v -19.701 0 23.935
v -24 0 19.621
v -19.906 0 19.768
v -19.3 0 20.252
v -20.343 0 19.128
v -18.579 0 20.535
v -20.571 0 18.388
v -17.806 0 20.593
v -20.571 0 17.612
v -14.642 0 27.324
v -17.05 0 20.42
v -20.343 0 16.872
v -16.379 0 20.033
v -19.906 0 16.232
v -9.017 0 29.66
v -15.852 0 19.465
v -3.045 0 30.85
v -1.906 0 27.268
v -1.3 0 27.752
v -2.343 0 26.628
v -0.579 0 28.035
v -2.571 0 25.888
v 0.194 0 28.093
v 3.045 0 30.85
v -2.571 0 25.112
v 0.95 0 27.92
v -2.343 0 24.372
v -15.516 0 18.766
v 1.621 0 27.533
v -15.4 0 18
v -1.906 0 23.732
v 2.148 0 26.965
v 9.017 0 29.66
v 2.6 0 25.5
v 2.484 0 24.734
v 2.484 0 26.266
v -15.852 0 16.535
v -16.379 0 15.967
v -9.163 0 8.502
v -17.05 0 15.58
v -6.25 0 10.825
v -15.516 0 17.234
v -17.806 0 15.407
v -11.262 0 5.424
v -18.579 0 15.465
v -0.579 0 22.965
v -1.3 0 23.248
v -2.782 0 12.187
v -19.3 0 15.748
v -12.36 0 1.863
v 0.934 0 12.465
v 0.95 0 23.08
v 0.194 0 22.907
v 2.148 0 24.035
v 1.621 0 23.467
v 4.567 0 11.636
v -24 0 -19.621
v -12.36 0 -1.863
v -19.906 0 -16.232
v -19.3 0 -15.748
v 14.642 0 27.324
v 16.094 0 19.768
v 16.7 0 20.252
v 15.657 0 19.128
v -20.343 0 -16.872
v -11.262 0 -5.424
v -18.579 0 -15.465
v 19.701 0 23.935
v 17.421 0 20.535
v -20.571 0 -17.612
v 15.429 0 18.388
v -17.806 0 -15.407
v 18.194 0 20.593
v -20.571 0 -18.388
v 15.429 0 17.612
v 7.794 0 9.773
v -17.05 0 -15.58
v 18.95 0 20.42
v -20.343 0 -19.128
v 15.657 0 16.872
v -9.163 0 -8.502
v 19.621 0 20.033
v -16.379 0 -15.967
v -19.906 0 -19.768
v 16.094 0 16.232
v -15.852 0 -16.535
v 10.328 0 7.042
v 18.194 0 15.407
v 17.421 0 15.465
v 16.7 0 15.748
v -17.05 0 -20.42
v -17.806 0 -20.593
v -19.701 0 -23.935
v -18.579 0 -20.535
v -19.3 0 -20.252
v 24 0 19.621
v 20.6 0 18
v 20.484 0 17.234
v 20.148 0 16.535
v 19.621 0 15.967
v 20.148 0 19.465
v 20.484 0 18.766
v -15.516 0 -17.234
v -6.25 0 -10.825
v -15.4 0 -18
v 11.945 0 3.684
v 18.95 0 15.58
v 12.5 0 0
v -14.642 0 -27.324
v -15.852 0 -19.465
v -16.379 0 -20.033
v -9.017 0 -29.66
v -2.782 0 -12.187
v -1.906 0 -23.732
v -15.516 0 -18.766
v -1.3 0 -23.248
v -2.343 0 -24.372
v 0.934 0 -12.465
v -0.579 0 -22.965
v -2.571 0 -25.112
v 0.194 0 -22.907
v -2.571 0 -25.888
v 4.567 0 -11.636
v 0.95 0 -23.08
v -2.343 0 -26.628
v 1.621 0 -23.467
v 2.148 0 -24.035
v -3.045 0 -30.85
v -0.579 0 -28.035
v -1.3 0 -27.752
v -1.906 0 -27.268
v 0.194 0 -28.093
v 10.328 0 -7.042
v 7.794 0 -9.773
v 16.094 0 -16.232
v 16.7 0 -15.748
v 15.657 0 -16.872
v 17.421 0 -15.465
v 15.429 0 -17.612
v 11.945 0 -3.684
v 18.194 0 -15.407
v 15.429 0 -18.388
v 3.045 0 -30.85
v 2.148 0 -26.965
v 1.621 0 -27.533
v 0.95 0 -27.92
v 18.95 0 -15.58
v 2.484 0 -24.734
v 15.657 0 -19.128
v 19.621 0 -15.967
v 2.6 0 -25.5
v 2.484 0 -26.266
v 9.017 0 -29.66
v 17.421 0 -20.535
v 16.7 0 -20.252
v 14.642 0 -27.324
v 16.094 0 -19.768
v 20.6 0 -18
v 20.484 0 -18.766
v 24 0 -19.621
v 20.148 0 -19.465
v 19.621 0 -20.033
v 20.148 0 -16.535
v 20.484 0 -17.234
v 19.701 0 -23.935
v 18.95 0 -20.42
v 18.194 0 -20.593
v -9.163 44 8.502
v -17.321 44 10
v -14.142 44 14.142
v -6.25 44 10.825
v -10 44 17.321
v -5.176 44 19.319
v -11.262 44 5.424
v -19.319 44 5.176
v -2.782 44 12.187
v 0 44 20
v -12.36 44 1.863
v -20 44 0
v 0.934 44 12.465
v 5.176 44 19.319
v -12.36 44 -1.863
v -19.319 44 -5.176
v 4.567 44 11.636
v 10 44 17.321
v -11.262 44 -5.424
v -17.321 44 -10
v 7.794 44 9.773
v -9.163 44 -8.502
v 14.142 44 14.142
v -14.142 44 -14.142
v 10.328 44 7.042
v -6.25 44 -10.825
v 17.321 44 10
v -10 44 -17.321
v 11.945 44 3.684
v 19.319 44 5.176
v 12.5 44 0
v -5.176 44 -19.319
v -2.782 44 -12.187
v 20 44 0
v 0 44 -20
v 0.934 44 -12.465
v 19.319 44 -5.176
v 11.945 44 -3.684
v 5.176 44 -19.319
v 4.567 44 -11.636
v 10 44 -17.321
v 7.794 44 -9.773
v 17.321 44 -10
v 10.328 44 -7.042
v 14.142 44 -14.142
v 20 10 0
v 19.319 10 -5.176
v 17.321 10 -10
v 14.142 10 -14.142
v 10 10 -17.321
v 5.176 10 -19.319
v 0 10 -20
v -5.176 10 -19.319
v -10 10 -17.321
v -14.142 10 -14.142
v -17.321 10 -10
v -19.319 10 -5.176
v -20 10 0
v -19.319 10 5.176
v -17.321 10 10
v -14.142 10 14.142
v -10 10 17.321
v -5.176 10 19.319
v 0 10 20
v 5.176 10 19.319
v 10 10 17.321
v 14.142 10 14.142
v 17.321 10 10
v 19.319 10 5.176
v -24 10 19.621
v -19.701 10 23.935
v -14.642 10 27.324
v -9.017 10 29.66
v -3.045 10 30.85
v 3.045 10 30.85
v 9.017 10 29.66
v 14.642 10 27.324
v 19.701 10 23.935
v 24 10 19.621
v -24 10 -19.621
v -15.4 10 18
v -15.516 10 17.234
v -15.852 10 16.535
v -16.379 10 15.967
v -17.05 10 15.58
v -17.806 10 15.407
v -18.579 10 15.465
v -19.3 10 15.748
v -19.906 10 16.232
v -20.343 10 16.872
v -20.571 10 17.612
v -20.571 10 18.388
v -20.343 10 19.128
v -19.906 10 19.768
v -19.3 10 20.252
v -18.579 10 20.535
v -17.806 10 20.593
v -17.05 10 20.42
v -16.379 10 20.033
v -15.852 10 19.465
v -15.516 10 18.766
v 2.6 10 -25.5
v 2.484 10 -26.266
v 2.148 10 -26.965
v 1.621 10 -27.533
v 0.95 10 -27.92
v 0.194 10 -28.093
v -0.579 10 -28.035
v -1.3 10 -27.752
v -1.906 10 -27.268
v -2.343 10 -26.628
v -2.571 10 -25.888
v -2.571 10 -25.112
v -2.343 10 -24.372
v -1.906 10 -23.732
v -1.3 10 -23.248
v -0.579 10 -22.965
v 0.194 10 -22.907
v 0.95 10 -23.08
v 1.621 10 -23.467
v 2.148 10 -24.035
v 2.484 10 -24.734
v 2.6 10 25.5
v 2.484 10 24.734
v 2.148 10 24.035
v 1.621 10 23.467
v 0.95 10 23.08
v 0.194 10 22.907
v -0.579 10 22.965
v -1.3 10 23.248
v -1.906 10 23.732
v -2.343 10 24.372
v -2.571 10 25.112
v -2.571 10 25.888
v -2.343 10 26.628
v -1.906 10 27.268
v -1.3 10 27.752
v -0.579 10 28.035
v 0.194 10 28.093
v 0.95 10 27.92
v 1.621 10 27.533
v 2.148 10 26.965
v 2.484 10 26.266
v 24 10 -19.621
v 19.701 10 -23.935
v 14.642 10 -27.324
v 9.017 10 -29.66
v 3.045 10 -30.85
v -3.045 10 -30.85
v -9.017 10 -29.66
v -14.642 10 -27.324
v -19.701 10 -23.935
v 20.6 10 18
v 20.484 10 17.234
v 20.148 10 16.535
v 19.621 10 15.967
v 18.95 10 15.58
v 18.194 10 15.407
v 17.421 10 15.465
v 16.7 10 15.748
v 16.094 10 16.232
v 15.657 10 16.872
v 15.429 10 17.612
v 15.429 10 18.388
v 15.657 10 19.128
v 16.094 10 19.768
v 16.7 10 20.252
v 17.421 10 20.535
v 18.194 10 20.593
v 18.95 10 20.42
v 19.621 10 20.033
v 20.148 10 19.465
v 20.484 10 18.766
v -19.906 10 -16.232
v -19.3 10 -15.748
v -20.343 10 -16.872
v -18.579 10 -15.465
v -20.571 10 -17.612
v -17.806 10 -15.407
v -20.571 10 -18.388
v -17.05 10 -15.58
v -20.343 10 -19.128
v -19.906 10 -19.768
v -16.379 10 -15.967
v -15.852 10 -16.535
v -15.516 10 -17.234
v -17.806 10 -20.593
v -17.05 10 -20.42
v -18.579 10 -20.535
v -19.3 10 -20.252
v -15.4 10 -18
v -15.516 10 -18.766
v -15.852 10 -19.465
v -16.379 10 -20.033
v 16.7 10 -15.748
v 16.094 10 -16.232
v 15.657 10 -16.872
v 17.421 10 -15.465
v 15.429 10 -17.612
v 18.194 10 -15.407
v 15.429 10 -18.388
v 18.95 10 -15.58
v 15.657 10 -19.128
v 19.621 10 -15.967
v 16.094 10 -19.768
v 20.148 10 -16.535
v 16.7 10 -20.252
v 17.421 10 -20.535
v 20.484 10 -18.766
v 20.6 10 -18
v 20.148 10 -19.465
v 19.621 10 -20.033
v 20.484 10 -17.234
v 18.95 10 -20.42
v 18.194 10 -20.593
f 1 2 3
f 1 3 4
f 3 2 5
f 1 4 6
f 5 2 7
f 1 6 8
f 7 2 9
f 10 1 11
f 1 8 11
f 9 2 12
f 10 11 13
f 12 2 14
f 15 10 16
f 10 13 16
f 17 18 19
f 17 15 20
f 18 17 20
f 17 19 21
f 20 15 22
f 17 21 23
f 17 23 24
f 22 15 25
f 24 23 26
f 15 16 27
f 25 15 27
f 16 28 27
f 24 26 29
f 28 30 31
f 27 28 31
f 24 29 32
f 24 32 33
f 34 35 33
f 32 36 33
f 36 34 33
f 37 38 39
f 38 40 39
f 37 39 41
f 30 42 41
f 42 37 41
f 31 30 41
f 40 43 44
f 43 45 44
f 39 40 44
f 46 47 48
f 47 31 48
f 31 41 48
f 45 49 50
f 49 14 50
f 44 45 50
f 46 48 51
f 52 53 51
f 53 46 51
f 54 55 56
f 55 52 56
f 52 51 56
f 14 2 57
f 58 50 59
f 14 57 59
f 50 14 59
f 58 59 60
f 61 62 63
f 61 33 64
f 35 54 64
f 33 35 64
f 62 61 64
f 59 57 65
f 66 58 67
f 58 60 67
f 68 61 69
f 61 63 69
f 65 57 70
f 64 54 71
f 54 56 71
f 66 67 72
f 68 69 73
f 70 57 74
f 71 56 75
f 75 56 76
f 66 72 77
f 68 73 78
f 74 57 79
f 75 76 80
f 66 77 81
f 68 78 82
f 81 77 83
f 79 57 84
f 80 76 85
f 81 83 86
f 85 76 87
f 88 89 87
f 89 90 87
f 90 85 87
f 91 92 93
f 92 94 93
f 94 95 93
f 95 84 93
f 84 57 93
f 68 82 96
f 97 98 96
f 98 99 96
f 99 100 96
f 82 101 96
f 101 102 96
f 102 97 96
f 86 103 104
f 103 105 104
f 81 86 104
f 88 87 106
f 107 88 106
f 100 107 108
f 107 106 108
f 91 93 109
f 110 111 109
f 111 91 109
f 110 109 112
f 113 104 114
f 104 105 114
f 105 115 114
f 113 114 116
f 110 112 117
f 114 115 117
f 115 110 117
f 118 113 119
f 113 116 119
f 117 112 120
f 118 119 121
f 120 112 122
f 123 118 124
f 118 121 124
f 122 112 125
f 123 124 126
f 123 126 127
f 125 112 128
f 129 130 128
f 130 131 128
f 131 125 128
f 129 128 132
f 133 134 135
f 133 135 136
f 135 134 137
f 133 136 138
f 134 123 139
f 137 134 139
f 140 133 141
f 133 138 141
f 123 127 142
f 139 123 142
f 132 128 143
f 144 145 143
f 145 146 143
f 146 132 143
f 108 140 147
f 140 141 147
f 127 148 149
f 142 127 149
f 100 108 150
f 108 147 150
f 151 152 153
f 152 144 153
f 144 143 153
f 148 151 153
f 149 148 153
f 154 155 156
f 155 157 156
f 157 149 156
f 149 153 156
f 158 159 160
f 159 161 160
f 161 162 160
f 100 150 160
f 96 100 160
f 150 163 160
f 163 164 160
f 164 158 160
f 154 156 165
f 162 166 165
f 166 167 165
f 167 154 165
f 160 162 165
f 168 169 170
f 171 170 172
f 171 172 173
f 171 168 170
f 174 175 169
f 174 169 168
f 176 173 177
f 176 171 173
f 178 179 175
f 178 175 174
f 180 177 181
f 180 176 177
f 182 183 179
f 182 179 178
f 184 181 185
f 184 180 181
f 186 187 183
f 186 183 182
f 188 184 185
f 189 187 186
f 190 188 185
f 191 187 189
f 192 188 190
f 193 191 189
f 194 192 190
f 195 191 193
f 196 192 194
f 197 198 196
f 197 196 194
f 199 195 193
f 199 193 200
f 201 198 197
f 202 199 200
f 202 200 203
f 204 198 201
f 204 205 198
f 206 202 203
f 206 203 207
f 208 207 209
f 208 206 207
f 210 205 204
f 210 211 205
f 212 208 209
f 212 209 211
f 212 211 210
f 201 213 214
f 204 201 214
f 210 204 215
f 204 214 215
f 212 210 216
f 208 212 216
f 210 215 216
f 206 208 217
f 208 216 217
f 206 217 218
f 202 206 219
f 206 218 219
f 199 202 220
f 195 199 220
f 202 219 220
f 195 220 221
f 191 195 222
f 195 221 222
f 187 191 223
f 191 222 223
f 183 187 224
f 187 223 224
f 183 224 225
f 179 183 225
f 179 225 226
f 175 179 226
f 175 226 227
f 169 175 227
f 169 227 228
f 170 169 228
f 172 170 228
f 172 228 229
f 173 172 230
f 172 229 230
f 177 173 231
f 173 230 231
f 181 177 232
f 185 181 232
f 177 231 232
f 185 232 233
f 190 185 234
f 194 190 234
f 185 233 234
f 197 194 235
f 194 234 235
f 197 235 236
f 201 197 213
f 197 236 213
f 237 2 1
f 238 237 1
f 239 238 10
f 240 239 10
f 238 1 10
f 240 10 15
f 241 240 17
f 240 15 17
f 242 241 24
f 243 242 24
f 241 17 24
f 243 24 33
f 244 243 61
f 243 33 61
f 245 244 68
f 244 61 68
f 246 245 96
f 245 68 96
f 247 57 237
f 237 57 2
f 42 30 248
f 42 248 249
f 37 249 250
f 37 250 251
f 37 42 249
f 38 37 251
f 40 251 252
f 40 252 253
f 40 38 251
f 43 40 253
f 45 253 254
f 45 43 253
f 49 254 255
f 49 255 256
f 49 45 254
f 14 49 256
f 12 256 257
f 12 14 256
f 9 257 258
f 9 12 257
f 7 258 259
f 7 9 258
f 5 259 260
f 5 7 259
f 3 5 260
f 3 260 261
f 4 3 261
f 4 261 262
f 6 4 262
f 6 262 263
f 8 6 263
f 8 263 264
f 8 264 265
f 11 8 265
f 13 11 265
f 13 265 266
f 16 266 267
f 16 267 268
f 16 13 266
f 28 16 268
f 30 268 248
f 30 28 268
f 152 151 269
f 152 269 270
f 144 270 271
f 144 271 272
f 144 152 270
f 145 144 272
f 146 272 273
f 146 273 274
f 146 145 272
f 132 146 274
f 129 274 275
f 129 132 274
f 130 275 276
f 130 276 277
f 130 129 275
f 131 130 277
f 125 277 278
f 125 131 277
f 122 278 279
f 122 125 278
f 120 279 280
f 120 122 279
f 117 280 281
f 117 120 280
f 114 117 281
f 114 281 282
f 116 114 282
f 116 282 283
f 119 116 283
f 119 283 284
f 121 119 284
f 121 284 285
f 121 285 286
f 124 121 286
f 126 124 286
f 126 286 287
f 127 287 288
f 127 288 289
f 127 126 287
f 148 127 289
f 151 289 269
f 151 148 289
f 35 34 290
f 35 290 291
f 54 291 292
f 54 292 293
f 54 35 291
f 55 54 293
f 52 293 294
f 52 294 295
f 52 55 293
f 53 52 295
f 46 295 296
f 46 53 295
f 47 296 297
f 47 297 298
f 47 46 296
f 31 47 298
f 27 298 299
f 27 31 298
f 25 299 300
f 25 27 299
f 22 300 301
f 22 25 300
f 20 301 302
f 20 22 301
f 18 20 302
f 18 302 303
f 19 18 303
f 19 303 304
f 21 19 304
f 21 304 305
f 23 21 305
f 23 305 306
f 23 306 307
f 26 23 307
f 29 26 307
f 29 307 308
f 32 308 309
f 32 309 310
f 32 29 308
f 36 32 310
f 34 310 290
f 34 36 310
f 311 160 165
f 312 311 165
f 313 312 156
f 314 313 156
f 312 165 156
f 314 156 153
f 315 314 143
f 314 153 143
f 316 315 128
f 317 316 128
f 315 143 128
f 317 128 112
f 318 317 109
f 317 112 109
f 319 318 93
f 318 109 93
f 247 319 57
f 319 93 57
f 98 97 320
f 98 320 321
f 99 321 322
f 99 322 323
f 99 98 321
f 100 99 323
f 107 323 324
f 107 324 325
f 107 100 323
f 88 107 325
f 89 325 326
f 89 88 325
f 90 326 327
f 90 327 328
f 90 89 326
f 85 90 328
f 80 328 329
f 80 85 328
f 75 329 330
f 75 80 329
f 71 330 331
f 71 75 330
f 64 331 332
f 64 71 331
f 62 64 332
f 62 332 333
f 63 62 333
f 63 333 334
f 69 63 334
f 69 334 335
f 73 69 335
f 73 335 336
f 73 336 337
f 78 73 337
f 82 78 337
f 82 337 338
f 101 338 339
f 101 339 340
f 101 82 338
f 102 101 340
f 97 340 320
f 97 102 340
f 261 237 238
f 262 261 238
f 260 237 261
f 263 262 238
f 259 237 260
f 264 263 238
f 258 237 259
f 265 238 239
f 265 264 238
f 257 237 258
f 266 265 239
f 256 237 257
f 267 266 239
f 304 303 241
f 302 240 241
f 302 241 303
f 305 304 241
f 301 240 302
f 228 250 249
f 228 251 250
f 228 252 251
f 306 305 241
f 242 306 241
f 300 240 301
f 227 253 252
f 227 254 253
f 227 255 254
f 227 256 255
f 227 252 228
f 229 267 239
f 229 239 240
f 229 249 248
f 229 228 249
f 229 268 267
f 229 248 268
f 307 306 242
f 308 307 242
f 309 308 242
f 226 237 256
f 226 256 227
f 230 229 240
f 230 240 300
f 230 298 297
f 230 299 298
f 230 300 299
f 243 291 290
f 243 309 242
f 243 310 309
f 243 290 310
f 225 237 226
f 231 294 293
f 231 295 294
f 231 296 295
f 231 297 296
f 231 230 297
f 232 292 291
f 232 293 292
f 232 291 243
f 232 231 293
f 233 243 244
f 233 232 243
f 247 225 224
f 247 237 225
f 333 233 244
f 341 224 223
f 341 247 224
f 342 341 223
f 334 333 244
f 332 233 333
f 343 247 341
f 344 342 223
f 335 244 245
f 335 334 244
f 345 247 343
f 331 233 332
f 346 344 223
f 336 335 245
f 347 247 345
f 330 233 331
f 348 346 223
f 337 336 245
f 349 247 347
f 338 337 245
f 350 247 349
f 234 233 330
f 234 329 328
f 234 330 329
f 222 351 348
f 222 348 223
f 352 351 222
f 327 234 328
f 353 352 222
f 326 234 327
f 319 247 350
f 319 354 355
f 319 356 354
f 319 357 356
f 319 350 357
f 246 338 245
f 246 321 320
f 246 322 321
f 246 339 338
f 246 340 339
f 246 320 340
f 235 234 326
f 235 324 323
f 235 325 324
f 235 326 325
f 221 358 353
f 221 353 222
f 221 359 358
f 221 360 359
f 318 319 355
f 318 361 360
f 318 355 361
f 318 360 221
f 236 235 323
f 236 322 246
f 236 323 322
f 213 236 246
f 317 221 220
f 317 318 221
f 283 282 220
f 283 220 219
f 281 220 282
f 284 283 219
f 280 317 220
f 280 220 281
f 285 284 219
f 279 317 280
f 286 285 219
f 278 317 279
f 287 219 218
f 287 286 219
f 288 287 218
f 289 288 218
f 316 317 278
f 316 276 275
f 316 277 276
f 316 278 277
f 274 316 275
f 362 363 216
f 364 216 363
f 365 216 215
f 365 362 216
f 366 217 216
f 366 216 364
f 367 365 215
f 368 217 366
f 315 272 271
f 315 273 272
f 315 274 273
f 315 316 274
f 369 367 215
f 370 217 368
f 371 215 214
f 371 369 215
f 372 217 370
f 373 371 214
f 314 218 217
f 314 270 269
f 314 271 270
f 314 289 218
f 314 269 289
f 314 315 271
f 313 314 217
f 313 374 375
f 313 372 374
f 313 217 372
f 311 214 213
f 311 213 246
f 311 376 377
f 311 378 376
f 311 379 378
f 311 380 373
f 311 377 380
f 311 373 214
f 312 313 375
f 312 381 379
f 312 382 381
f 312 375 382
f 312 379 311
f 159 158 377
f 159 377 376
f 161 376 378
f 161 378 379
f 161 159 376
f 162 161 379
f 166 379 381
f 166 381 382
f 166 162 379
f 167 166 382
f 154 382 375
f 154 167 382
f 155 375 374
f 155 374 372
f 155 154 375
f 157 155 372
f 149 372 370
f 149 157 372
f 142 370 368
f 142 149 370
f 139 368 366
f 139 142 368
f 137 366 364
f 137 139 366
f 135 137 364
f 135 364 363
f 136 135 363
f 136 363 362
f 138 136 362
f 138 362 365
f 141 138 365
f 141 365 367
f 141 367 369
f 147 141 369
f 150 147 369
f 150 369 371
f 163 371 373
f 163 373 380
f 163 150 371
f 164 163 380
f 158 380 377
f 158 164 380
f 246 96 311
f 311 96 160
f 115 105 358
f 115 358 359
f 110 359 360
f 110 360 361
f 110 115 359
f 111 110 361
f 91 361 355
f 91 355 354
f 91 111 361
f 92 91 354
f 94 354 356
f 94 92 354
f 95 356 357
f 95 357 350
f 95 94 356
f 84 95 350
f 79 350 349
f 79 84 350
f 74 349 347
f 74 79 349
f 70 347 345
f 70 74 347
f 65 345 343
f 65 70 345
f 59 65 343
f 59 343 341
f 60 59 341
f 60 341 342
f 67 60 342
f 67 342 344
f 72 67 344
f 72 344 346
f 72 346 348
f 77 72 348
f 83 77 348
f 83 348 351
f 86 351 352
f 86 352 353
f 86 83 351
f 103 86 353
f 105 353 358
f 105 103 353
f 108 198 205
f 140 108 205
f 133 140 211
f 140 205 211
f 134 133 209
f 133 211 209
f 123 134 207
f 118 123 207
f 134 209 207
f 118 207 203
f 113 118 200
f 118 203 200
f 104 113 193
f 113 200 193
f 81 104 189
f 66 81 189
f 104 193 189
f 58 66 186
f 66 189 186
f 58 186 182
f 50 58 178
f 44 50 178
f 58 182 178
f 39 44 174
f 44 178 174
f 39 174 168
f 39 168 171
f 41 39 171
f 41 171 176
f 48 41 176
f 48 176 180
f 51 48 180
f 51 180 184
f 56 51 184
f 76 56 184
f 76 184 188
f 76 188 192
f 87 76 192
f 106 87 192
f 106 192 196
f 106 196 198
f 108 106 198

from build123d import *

# Parameters (mm, degrees)
SKETCH1_R           = 2.6
BOSS_EXTRUDE1_DEPTH = 10
SKETCH2_R           = 20
BOSS_EXTRUDE2_DEPTH = 34
CUT_EXTRUDE1_REACH  = 46
SKETCH3_R           = 12.5


with BuildPart() as part:
    # Sketch1 → Boss-Extrude1 (new body)
    with BuildSketch(Plane(origin=(0, 0, 0), x_dir=(1, 0, 0), z_dir=(0, 1, 0))):
        with BuildLine():
            Line((-24, 19.62141687), (-24, -19.62141687))
            ThreePointArc((-24, -19.62141687), (0, -31), (24, -19.62141687))
            Line((24, -19.62141687), (24, 19.62141687))
            ThreePointArc((24, 19.62141687), (0, 31), (-24, 19.62141687))
        make_face()
        with Locations((18, 18)):
            Circle(SKETCH1_R, mode=Mode.SUBTRACT)
        with Locations((0, 25.5)):
            Circle(SKETCH1_R, mode=Mode.SUBTRACT)
        with Locations((-18, 18)):
            Circle(SKETCH1_R, mode=Mode.SUBTRACT)
        with Locations((-18, -18)):
            Circle(SKETCH1_R, mode=Mode.SUBTRACT)
        with Locations((18, -18)):
            Circle(SKETCH1_R, mode=Mode.SUBTRACT)
        with Locations((0, -25.5)):
            Circle(SKETCH1_R, mode=Mode.SUBTRACT)
    extrude(amount=BOSS_EXTRUDE1_DEPTH)

    # Sketch2 → Boss-Extrude2 (add)
    with BuildSketch(Plane(origin=(0, 10, 0), x_dir=(1, 0, 0), z_dir=(0, 1, 0))):
        Circle(SKETCH2_R)
    extrude(amount=BOSS_EXTRUDE2_DEPTH)

    # Sketch3 → Cut-Extrude1 (cut, up to next)
    with BuildSketch(Plane(origin=(0, 44, 0), x_dir=(1, 0, 0), z_dir=(0, 1, 0)), mode=Mode.PRIVATE) as cut_extrude1_sk1:
        Circle(SKETCH3_R)
    cut_extrude1_tool1 = extrude(cut_extrude1_sk1.sketch, amount=-CUT_EXTRUDE1_REACH, mode=Mode.PRIVATE) & part.part
    add(cut_extrude1_tool1.solids().sort_by_distance((0, 44, 0))[0], mode=Mode.SUBTRACT)


solid = part.part
